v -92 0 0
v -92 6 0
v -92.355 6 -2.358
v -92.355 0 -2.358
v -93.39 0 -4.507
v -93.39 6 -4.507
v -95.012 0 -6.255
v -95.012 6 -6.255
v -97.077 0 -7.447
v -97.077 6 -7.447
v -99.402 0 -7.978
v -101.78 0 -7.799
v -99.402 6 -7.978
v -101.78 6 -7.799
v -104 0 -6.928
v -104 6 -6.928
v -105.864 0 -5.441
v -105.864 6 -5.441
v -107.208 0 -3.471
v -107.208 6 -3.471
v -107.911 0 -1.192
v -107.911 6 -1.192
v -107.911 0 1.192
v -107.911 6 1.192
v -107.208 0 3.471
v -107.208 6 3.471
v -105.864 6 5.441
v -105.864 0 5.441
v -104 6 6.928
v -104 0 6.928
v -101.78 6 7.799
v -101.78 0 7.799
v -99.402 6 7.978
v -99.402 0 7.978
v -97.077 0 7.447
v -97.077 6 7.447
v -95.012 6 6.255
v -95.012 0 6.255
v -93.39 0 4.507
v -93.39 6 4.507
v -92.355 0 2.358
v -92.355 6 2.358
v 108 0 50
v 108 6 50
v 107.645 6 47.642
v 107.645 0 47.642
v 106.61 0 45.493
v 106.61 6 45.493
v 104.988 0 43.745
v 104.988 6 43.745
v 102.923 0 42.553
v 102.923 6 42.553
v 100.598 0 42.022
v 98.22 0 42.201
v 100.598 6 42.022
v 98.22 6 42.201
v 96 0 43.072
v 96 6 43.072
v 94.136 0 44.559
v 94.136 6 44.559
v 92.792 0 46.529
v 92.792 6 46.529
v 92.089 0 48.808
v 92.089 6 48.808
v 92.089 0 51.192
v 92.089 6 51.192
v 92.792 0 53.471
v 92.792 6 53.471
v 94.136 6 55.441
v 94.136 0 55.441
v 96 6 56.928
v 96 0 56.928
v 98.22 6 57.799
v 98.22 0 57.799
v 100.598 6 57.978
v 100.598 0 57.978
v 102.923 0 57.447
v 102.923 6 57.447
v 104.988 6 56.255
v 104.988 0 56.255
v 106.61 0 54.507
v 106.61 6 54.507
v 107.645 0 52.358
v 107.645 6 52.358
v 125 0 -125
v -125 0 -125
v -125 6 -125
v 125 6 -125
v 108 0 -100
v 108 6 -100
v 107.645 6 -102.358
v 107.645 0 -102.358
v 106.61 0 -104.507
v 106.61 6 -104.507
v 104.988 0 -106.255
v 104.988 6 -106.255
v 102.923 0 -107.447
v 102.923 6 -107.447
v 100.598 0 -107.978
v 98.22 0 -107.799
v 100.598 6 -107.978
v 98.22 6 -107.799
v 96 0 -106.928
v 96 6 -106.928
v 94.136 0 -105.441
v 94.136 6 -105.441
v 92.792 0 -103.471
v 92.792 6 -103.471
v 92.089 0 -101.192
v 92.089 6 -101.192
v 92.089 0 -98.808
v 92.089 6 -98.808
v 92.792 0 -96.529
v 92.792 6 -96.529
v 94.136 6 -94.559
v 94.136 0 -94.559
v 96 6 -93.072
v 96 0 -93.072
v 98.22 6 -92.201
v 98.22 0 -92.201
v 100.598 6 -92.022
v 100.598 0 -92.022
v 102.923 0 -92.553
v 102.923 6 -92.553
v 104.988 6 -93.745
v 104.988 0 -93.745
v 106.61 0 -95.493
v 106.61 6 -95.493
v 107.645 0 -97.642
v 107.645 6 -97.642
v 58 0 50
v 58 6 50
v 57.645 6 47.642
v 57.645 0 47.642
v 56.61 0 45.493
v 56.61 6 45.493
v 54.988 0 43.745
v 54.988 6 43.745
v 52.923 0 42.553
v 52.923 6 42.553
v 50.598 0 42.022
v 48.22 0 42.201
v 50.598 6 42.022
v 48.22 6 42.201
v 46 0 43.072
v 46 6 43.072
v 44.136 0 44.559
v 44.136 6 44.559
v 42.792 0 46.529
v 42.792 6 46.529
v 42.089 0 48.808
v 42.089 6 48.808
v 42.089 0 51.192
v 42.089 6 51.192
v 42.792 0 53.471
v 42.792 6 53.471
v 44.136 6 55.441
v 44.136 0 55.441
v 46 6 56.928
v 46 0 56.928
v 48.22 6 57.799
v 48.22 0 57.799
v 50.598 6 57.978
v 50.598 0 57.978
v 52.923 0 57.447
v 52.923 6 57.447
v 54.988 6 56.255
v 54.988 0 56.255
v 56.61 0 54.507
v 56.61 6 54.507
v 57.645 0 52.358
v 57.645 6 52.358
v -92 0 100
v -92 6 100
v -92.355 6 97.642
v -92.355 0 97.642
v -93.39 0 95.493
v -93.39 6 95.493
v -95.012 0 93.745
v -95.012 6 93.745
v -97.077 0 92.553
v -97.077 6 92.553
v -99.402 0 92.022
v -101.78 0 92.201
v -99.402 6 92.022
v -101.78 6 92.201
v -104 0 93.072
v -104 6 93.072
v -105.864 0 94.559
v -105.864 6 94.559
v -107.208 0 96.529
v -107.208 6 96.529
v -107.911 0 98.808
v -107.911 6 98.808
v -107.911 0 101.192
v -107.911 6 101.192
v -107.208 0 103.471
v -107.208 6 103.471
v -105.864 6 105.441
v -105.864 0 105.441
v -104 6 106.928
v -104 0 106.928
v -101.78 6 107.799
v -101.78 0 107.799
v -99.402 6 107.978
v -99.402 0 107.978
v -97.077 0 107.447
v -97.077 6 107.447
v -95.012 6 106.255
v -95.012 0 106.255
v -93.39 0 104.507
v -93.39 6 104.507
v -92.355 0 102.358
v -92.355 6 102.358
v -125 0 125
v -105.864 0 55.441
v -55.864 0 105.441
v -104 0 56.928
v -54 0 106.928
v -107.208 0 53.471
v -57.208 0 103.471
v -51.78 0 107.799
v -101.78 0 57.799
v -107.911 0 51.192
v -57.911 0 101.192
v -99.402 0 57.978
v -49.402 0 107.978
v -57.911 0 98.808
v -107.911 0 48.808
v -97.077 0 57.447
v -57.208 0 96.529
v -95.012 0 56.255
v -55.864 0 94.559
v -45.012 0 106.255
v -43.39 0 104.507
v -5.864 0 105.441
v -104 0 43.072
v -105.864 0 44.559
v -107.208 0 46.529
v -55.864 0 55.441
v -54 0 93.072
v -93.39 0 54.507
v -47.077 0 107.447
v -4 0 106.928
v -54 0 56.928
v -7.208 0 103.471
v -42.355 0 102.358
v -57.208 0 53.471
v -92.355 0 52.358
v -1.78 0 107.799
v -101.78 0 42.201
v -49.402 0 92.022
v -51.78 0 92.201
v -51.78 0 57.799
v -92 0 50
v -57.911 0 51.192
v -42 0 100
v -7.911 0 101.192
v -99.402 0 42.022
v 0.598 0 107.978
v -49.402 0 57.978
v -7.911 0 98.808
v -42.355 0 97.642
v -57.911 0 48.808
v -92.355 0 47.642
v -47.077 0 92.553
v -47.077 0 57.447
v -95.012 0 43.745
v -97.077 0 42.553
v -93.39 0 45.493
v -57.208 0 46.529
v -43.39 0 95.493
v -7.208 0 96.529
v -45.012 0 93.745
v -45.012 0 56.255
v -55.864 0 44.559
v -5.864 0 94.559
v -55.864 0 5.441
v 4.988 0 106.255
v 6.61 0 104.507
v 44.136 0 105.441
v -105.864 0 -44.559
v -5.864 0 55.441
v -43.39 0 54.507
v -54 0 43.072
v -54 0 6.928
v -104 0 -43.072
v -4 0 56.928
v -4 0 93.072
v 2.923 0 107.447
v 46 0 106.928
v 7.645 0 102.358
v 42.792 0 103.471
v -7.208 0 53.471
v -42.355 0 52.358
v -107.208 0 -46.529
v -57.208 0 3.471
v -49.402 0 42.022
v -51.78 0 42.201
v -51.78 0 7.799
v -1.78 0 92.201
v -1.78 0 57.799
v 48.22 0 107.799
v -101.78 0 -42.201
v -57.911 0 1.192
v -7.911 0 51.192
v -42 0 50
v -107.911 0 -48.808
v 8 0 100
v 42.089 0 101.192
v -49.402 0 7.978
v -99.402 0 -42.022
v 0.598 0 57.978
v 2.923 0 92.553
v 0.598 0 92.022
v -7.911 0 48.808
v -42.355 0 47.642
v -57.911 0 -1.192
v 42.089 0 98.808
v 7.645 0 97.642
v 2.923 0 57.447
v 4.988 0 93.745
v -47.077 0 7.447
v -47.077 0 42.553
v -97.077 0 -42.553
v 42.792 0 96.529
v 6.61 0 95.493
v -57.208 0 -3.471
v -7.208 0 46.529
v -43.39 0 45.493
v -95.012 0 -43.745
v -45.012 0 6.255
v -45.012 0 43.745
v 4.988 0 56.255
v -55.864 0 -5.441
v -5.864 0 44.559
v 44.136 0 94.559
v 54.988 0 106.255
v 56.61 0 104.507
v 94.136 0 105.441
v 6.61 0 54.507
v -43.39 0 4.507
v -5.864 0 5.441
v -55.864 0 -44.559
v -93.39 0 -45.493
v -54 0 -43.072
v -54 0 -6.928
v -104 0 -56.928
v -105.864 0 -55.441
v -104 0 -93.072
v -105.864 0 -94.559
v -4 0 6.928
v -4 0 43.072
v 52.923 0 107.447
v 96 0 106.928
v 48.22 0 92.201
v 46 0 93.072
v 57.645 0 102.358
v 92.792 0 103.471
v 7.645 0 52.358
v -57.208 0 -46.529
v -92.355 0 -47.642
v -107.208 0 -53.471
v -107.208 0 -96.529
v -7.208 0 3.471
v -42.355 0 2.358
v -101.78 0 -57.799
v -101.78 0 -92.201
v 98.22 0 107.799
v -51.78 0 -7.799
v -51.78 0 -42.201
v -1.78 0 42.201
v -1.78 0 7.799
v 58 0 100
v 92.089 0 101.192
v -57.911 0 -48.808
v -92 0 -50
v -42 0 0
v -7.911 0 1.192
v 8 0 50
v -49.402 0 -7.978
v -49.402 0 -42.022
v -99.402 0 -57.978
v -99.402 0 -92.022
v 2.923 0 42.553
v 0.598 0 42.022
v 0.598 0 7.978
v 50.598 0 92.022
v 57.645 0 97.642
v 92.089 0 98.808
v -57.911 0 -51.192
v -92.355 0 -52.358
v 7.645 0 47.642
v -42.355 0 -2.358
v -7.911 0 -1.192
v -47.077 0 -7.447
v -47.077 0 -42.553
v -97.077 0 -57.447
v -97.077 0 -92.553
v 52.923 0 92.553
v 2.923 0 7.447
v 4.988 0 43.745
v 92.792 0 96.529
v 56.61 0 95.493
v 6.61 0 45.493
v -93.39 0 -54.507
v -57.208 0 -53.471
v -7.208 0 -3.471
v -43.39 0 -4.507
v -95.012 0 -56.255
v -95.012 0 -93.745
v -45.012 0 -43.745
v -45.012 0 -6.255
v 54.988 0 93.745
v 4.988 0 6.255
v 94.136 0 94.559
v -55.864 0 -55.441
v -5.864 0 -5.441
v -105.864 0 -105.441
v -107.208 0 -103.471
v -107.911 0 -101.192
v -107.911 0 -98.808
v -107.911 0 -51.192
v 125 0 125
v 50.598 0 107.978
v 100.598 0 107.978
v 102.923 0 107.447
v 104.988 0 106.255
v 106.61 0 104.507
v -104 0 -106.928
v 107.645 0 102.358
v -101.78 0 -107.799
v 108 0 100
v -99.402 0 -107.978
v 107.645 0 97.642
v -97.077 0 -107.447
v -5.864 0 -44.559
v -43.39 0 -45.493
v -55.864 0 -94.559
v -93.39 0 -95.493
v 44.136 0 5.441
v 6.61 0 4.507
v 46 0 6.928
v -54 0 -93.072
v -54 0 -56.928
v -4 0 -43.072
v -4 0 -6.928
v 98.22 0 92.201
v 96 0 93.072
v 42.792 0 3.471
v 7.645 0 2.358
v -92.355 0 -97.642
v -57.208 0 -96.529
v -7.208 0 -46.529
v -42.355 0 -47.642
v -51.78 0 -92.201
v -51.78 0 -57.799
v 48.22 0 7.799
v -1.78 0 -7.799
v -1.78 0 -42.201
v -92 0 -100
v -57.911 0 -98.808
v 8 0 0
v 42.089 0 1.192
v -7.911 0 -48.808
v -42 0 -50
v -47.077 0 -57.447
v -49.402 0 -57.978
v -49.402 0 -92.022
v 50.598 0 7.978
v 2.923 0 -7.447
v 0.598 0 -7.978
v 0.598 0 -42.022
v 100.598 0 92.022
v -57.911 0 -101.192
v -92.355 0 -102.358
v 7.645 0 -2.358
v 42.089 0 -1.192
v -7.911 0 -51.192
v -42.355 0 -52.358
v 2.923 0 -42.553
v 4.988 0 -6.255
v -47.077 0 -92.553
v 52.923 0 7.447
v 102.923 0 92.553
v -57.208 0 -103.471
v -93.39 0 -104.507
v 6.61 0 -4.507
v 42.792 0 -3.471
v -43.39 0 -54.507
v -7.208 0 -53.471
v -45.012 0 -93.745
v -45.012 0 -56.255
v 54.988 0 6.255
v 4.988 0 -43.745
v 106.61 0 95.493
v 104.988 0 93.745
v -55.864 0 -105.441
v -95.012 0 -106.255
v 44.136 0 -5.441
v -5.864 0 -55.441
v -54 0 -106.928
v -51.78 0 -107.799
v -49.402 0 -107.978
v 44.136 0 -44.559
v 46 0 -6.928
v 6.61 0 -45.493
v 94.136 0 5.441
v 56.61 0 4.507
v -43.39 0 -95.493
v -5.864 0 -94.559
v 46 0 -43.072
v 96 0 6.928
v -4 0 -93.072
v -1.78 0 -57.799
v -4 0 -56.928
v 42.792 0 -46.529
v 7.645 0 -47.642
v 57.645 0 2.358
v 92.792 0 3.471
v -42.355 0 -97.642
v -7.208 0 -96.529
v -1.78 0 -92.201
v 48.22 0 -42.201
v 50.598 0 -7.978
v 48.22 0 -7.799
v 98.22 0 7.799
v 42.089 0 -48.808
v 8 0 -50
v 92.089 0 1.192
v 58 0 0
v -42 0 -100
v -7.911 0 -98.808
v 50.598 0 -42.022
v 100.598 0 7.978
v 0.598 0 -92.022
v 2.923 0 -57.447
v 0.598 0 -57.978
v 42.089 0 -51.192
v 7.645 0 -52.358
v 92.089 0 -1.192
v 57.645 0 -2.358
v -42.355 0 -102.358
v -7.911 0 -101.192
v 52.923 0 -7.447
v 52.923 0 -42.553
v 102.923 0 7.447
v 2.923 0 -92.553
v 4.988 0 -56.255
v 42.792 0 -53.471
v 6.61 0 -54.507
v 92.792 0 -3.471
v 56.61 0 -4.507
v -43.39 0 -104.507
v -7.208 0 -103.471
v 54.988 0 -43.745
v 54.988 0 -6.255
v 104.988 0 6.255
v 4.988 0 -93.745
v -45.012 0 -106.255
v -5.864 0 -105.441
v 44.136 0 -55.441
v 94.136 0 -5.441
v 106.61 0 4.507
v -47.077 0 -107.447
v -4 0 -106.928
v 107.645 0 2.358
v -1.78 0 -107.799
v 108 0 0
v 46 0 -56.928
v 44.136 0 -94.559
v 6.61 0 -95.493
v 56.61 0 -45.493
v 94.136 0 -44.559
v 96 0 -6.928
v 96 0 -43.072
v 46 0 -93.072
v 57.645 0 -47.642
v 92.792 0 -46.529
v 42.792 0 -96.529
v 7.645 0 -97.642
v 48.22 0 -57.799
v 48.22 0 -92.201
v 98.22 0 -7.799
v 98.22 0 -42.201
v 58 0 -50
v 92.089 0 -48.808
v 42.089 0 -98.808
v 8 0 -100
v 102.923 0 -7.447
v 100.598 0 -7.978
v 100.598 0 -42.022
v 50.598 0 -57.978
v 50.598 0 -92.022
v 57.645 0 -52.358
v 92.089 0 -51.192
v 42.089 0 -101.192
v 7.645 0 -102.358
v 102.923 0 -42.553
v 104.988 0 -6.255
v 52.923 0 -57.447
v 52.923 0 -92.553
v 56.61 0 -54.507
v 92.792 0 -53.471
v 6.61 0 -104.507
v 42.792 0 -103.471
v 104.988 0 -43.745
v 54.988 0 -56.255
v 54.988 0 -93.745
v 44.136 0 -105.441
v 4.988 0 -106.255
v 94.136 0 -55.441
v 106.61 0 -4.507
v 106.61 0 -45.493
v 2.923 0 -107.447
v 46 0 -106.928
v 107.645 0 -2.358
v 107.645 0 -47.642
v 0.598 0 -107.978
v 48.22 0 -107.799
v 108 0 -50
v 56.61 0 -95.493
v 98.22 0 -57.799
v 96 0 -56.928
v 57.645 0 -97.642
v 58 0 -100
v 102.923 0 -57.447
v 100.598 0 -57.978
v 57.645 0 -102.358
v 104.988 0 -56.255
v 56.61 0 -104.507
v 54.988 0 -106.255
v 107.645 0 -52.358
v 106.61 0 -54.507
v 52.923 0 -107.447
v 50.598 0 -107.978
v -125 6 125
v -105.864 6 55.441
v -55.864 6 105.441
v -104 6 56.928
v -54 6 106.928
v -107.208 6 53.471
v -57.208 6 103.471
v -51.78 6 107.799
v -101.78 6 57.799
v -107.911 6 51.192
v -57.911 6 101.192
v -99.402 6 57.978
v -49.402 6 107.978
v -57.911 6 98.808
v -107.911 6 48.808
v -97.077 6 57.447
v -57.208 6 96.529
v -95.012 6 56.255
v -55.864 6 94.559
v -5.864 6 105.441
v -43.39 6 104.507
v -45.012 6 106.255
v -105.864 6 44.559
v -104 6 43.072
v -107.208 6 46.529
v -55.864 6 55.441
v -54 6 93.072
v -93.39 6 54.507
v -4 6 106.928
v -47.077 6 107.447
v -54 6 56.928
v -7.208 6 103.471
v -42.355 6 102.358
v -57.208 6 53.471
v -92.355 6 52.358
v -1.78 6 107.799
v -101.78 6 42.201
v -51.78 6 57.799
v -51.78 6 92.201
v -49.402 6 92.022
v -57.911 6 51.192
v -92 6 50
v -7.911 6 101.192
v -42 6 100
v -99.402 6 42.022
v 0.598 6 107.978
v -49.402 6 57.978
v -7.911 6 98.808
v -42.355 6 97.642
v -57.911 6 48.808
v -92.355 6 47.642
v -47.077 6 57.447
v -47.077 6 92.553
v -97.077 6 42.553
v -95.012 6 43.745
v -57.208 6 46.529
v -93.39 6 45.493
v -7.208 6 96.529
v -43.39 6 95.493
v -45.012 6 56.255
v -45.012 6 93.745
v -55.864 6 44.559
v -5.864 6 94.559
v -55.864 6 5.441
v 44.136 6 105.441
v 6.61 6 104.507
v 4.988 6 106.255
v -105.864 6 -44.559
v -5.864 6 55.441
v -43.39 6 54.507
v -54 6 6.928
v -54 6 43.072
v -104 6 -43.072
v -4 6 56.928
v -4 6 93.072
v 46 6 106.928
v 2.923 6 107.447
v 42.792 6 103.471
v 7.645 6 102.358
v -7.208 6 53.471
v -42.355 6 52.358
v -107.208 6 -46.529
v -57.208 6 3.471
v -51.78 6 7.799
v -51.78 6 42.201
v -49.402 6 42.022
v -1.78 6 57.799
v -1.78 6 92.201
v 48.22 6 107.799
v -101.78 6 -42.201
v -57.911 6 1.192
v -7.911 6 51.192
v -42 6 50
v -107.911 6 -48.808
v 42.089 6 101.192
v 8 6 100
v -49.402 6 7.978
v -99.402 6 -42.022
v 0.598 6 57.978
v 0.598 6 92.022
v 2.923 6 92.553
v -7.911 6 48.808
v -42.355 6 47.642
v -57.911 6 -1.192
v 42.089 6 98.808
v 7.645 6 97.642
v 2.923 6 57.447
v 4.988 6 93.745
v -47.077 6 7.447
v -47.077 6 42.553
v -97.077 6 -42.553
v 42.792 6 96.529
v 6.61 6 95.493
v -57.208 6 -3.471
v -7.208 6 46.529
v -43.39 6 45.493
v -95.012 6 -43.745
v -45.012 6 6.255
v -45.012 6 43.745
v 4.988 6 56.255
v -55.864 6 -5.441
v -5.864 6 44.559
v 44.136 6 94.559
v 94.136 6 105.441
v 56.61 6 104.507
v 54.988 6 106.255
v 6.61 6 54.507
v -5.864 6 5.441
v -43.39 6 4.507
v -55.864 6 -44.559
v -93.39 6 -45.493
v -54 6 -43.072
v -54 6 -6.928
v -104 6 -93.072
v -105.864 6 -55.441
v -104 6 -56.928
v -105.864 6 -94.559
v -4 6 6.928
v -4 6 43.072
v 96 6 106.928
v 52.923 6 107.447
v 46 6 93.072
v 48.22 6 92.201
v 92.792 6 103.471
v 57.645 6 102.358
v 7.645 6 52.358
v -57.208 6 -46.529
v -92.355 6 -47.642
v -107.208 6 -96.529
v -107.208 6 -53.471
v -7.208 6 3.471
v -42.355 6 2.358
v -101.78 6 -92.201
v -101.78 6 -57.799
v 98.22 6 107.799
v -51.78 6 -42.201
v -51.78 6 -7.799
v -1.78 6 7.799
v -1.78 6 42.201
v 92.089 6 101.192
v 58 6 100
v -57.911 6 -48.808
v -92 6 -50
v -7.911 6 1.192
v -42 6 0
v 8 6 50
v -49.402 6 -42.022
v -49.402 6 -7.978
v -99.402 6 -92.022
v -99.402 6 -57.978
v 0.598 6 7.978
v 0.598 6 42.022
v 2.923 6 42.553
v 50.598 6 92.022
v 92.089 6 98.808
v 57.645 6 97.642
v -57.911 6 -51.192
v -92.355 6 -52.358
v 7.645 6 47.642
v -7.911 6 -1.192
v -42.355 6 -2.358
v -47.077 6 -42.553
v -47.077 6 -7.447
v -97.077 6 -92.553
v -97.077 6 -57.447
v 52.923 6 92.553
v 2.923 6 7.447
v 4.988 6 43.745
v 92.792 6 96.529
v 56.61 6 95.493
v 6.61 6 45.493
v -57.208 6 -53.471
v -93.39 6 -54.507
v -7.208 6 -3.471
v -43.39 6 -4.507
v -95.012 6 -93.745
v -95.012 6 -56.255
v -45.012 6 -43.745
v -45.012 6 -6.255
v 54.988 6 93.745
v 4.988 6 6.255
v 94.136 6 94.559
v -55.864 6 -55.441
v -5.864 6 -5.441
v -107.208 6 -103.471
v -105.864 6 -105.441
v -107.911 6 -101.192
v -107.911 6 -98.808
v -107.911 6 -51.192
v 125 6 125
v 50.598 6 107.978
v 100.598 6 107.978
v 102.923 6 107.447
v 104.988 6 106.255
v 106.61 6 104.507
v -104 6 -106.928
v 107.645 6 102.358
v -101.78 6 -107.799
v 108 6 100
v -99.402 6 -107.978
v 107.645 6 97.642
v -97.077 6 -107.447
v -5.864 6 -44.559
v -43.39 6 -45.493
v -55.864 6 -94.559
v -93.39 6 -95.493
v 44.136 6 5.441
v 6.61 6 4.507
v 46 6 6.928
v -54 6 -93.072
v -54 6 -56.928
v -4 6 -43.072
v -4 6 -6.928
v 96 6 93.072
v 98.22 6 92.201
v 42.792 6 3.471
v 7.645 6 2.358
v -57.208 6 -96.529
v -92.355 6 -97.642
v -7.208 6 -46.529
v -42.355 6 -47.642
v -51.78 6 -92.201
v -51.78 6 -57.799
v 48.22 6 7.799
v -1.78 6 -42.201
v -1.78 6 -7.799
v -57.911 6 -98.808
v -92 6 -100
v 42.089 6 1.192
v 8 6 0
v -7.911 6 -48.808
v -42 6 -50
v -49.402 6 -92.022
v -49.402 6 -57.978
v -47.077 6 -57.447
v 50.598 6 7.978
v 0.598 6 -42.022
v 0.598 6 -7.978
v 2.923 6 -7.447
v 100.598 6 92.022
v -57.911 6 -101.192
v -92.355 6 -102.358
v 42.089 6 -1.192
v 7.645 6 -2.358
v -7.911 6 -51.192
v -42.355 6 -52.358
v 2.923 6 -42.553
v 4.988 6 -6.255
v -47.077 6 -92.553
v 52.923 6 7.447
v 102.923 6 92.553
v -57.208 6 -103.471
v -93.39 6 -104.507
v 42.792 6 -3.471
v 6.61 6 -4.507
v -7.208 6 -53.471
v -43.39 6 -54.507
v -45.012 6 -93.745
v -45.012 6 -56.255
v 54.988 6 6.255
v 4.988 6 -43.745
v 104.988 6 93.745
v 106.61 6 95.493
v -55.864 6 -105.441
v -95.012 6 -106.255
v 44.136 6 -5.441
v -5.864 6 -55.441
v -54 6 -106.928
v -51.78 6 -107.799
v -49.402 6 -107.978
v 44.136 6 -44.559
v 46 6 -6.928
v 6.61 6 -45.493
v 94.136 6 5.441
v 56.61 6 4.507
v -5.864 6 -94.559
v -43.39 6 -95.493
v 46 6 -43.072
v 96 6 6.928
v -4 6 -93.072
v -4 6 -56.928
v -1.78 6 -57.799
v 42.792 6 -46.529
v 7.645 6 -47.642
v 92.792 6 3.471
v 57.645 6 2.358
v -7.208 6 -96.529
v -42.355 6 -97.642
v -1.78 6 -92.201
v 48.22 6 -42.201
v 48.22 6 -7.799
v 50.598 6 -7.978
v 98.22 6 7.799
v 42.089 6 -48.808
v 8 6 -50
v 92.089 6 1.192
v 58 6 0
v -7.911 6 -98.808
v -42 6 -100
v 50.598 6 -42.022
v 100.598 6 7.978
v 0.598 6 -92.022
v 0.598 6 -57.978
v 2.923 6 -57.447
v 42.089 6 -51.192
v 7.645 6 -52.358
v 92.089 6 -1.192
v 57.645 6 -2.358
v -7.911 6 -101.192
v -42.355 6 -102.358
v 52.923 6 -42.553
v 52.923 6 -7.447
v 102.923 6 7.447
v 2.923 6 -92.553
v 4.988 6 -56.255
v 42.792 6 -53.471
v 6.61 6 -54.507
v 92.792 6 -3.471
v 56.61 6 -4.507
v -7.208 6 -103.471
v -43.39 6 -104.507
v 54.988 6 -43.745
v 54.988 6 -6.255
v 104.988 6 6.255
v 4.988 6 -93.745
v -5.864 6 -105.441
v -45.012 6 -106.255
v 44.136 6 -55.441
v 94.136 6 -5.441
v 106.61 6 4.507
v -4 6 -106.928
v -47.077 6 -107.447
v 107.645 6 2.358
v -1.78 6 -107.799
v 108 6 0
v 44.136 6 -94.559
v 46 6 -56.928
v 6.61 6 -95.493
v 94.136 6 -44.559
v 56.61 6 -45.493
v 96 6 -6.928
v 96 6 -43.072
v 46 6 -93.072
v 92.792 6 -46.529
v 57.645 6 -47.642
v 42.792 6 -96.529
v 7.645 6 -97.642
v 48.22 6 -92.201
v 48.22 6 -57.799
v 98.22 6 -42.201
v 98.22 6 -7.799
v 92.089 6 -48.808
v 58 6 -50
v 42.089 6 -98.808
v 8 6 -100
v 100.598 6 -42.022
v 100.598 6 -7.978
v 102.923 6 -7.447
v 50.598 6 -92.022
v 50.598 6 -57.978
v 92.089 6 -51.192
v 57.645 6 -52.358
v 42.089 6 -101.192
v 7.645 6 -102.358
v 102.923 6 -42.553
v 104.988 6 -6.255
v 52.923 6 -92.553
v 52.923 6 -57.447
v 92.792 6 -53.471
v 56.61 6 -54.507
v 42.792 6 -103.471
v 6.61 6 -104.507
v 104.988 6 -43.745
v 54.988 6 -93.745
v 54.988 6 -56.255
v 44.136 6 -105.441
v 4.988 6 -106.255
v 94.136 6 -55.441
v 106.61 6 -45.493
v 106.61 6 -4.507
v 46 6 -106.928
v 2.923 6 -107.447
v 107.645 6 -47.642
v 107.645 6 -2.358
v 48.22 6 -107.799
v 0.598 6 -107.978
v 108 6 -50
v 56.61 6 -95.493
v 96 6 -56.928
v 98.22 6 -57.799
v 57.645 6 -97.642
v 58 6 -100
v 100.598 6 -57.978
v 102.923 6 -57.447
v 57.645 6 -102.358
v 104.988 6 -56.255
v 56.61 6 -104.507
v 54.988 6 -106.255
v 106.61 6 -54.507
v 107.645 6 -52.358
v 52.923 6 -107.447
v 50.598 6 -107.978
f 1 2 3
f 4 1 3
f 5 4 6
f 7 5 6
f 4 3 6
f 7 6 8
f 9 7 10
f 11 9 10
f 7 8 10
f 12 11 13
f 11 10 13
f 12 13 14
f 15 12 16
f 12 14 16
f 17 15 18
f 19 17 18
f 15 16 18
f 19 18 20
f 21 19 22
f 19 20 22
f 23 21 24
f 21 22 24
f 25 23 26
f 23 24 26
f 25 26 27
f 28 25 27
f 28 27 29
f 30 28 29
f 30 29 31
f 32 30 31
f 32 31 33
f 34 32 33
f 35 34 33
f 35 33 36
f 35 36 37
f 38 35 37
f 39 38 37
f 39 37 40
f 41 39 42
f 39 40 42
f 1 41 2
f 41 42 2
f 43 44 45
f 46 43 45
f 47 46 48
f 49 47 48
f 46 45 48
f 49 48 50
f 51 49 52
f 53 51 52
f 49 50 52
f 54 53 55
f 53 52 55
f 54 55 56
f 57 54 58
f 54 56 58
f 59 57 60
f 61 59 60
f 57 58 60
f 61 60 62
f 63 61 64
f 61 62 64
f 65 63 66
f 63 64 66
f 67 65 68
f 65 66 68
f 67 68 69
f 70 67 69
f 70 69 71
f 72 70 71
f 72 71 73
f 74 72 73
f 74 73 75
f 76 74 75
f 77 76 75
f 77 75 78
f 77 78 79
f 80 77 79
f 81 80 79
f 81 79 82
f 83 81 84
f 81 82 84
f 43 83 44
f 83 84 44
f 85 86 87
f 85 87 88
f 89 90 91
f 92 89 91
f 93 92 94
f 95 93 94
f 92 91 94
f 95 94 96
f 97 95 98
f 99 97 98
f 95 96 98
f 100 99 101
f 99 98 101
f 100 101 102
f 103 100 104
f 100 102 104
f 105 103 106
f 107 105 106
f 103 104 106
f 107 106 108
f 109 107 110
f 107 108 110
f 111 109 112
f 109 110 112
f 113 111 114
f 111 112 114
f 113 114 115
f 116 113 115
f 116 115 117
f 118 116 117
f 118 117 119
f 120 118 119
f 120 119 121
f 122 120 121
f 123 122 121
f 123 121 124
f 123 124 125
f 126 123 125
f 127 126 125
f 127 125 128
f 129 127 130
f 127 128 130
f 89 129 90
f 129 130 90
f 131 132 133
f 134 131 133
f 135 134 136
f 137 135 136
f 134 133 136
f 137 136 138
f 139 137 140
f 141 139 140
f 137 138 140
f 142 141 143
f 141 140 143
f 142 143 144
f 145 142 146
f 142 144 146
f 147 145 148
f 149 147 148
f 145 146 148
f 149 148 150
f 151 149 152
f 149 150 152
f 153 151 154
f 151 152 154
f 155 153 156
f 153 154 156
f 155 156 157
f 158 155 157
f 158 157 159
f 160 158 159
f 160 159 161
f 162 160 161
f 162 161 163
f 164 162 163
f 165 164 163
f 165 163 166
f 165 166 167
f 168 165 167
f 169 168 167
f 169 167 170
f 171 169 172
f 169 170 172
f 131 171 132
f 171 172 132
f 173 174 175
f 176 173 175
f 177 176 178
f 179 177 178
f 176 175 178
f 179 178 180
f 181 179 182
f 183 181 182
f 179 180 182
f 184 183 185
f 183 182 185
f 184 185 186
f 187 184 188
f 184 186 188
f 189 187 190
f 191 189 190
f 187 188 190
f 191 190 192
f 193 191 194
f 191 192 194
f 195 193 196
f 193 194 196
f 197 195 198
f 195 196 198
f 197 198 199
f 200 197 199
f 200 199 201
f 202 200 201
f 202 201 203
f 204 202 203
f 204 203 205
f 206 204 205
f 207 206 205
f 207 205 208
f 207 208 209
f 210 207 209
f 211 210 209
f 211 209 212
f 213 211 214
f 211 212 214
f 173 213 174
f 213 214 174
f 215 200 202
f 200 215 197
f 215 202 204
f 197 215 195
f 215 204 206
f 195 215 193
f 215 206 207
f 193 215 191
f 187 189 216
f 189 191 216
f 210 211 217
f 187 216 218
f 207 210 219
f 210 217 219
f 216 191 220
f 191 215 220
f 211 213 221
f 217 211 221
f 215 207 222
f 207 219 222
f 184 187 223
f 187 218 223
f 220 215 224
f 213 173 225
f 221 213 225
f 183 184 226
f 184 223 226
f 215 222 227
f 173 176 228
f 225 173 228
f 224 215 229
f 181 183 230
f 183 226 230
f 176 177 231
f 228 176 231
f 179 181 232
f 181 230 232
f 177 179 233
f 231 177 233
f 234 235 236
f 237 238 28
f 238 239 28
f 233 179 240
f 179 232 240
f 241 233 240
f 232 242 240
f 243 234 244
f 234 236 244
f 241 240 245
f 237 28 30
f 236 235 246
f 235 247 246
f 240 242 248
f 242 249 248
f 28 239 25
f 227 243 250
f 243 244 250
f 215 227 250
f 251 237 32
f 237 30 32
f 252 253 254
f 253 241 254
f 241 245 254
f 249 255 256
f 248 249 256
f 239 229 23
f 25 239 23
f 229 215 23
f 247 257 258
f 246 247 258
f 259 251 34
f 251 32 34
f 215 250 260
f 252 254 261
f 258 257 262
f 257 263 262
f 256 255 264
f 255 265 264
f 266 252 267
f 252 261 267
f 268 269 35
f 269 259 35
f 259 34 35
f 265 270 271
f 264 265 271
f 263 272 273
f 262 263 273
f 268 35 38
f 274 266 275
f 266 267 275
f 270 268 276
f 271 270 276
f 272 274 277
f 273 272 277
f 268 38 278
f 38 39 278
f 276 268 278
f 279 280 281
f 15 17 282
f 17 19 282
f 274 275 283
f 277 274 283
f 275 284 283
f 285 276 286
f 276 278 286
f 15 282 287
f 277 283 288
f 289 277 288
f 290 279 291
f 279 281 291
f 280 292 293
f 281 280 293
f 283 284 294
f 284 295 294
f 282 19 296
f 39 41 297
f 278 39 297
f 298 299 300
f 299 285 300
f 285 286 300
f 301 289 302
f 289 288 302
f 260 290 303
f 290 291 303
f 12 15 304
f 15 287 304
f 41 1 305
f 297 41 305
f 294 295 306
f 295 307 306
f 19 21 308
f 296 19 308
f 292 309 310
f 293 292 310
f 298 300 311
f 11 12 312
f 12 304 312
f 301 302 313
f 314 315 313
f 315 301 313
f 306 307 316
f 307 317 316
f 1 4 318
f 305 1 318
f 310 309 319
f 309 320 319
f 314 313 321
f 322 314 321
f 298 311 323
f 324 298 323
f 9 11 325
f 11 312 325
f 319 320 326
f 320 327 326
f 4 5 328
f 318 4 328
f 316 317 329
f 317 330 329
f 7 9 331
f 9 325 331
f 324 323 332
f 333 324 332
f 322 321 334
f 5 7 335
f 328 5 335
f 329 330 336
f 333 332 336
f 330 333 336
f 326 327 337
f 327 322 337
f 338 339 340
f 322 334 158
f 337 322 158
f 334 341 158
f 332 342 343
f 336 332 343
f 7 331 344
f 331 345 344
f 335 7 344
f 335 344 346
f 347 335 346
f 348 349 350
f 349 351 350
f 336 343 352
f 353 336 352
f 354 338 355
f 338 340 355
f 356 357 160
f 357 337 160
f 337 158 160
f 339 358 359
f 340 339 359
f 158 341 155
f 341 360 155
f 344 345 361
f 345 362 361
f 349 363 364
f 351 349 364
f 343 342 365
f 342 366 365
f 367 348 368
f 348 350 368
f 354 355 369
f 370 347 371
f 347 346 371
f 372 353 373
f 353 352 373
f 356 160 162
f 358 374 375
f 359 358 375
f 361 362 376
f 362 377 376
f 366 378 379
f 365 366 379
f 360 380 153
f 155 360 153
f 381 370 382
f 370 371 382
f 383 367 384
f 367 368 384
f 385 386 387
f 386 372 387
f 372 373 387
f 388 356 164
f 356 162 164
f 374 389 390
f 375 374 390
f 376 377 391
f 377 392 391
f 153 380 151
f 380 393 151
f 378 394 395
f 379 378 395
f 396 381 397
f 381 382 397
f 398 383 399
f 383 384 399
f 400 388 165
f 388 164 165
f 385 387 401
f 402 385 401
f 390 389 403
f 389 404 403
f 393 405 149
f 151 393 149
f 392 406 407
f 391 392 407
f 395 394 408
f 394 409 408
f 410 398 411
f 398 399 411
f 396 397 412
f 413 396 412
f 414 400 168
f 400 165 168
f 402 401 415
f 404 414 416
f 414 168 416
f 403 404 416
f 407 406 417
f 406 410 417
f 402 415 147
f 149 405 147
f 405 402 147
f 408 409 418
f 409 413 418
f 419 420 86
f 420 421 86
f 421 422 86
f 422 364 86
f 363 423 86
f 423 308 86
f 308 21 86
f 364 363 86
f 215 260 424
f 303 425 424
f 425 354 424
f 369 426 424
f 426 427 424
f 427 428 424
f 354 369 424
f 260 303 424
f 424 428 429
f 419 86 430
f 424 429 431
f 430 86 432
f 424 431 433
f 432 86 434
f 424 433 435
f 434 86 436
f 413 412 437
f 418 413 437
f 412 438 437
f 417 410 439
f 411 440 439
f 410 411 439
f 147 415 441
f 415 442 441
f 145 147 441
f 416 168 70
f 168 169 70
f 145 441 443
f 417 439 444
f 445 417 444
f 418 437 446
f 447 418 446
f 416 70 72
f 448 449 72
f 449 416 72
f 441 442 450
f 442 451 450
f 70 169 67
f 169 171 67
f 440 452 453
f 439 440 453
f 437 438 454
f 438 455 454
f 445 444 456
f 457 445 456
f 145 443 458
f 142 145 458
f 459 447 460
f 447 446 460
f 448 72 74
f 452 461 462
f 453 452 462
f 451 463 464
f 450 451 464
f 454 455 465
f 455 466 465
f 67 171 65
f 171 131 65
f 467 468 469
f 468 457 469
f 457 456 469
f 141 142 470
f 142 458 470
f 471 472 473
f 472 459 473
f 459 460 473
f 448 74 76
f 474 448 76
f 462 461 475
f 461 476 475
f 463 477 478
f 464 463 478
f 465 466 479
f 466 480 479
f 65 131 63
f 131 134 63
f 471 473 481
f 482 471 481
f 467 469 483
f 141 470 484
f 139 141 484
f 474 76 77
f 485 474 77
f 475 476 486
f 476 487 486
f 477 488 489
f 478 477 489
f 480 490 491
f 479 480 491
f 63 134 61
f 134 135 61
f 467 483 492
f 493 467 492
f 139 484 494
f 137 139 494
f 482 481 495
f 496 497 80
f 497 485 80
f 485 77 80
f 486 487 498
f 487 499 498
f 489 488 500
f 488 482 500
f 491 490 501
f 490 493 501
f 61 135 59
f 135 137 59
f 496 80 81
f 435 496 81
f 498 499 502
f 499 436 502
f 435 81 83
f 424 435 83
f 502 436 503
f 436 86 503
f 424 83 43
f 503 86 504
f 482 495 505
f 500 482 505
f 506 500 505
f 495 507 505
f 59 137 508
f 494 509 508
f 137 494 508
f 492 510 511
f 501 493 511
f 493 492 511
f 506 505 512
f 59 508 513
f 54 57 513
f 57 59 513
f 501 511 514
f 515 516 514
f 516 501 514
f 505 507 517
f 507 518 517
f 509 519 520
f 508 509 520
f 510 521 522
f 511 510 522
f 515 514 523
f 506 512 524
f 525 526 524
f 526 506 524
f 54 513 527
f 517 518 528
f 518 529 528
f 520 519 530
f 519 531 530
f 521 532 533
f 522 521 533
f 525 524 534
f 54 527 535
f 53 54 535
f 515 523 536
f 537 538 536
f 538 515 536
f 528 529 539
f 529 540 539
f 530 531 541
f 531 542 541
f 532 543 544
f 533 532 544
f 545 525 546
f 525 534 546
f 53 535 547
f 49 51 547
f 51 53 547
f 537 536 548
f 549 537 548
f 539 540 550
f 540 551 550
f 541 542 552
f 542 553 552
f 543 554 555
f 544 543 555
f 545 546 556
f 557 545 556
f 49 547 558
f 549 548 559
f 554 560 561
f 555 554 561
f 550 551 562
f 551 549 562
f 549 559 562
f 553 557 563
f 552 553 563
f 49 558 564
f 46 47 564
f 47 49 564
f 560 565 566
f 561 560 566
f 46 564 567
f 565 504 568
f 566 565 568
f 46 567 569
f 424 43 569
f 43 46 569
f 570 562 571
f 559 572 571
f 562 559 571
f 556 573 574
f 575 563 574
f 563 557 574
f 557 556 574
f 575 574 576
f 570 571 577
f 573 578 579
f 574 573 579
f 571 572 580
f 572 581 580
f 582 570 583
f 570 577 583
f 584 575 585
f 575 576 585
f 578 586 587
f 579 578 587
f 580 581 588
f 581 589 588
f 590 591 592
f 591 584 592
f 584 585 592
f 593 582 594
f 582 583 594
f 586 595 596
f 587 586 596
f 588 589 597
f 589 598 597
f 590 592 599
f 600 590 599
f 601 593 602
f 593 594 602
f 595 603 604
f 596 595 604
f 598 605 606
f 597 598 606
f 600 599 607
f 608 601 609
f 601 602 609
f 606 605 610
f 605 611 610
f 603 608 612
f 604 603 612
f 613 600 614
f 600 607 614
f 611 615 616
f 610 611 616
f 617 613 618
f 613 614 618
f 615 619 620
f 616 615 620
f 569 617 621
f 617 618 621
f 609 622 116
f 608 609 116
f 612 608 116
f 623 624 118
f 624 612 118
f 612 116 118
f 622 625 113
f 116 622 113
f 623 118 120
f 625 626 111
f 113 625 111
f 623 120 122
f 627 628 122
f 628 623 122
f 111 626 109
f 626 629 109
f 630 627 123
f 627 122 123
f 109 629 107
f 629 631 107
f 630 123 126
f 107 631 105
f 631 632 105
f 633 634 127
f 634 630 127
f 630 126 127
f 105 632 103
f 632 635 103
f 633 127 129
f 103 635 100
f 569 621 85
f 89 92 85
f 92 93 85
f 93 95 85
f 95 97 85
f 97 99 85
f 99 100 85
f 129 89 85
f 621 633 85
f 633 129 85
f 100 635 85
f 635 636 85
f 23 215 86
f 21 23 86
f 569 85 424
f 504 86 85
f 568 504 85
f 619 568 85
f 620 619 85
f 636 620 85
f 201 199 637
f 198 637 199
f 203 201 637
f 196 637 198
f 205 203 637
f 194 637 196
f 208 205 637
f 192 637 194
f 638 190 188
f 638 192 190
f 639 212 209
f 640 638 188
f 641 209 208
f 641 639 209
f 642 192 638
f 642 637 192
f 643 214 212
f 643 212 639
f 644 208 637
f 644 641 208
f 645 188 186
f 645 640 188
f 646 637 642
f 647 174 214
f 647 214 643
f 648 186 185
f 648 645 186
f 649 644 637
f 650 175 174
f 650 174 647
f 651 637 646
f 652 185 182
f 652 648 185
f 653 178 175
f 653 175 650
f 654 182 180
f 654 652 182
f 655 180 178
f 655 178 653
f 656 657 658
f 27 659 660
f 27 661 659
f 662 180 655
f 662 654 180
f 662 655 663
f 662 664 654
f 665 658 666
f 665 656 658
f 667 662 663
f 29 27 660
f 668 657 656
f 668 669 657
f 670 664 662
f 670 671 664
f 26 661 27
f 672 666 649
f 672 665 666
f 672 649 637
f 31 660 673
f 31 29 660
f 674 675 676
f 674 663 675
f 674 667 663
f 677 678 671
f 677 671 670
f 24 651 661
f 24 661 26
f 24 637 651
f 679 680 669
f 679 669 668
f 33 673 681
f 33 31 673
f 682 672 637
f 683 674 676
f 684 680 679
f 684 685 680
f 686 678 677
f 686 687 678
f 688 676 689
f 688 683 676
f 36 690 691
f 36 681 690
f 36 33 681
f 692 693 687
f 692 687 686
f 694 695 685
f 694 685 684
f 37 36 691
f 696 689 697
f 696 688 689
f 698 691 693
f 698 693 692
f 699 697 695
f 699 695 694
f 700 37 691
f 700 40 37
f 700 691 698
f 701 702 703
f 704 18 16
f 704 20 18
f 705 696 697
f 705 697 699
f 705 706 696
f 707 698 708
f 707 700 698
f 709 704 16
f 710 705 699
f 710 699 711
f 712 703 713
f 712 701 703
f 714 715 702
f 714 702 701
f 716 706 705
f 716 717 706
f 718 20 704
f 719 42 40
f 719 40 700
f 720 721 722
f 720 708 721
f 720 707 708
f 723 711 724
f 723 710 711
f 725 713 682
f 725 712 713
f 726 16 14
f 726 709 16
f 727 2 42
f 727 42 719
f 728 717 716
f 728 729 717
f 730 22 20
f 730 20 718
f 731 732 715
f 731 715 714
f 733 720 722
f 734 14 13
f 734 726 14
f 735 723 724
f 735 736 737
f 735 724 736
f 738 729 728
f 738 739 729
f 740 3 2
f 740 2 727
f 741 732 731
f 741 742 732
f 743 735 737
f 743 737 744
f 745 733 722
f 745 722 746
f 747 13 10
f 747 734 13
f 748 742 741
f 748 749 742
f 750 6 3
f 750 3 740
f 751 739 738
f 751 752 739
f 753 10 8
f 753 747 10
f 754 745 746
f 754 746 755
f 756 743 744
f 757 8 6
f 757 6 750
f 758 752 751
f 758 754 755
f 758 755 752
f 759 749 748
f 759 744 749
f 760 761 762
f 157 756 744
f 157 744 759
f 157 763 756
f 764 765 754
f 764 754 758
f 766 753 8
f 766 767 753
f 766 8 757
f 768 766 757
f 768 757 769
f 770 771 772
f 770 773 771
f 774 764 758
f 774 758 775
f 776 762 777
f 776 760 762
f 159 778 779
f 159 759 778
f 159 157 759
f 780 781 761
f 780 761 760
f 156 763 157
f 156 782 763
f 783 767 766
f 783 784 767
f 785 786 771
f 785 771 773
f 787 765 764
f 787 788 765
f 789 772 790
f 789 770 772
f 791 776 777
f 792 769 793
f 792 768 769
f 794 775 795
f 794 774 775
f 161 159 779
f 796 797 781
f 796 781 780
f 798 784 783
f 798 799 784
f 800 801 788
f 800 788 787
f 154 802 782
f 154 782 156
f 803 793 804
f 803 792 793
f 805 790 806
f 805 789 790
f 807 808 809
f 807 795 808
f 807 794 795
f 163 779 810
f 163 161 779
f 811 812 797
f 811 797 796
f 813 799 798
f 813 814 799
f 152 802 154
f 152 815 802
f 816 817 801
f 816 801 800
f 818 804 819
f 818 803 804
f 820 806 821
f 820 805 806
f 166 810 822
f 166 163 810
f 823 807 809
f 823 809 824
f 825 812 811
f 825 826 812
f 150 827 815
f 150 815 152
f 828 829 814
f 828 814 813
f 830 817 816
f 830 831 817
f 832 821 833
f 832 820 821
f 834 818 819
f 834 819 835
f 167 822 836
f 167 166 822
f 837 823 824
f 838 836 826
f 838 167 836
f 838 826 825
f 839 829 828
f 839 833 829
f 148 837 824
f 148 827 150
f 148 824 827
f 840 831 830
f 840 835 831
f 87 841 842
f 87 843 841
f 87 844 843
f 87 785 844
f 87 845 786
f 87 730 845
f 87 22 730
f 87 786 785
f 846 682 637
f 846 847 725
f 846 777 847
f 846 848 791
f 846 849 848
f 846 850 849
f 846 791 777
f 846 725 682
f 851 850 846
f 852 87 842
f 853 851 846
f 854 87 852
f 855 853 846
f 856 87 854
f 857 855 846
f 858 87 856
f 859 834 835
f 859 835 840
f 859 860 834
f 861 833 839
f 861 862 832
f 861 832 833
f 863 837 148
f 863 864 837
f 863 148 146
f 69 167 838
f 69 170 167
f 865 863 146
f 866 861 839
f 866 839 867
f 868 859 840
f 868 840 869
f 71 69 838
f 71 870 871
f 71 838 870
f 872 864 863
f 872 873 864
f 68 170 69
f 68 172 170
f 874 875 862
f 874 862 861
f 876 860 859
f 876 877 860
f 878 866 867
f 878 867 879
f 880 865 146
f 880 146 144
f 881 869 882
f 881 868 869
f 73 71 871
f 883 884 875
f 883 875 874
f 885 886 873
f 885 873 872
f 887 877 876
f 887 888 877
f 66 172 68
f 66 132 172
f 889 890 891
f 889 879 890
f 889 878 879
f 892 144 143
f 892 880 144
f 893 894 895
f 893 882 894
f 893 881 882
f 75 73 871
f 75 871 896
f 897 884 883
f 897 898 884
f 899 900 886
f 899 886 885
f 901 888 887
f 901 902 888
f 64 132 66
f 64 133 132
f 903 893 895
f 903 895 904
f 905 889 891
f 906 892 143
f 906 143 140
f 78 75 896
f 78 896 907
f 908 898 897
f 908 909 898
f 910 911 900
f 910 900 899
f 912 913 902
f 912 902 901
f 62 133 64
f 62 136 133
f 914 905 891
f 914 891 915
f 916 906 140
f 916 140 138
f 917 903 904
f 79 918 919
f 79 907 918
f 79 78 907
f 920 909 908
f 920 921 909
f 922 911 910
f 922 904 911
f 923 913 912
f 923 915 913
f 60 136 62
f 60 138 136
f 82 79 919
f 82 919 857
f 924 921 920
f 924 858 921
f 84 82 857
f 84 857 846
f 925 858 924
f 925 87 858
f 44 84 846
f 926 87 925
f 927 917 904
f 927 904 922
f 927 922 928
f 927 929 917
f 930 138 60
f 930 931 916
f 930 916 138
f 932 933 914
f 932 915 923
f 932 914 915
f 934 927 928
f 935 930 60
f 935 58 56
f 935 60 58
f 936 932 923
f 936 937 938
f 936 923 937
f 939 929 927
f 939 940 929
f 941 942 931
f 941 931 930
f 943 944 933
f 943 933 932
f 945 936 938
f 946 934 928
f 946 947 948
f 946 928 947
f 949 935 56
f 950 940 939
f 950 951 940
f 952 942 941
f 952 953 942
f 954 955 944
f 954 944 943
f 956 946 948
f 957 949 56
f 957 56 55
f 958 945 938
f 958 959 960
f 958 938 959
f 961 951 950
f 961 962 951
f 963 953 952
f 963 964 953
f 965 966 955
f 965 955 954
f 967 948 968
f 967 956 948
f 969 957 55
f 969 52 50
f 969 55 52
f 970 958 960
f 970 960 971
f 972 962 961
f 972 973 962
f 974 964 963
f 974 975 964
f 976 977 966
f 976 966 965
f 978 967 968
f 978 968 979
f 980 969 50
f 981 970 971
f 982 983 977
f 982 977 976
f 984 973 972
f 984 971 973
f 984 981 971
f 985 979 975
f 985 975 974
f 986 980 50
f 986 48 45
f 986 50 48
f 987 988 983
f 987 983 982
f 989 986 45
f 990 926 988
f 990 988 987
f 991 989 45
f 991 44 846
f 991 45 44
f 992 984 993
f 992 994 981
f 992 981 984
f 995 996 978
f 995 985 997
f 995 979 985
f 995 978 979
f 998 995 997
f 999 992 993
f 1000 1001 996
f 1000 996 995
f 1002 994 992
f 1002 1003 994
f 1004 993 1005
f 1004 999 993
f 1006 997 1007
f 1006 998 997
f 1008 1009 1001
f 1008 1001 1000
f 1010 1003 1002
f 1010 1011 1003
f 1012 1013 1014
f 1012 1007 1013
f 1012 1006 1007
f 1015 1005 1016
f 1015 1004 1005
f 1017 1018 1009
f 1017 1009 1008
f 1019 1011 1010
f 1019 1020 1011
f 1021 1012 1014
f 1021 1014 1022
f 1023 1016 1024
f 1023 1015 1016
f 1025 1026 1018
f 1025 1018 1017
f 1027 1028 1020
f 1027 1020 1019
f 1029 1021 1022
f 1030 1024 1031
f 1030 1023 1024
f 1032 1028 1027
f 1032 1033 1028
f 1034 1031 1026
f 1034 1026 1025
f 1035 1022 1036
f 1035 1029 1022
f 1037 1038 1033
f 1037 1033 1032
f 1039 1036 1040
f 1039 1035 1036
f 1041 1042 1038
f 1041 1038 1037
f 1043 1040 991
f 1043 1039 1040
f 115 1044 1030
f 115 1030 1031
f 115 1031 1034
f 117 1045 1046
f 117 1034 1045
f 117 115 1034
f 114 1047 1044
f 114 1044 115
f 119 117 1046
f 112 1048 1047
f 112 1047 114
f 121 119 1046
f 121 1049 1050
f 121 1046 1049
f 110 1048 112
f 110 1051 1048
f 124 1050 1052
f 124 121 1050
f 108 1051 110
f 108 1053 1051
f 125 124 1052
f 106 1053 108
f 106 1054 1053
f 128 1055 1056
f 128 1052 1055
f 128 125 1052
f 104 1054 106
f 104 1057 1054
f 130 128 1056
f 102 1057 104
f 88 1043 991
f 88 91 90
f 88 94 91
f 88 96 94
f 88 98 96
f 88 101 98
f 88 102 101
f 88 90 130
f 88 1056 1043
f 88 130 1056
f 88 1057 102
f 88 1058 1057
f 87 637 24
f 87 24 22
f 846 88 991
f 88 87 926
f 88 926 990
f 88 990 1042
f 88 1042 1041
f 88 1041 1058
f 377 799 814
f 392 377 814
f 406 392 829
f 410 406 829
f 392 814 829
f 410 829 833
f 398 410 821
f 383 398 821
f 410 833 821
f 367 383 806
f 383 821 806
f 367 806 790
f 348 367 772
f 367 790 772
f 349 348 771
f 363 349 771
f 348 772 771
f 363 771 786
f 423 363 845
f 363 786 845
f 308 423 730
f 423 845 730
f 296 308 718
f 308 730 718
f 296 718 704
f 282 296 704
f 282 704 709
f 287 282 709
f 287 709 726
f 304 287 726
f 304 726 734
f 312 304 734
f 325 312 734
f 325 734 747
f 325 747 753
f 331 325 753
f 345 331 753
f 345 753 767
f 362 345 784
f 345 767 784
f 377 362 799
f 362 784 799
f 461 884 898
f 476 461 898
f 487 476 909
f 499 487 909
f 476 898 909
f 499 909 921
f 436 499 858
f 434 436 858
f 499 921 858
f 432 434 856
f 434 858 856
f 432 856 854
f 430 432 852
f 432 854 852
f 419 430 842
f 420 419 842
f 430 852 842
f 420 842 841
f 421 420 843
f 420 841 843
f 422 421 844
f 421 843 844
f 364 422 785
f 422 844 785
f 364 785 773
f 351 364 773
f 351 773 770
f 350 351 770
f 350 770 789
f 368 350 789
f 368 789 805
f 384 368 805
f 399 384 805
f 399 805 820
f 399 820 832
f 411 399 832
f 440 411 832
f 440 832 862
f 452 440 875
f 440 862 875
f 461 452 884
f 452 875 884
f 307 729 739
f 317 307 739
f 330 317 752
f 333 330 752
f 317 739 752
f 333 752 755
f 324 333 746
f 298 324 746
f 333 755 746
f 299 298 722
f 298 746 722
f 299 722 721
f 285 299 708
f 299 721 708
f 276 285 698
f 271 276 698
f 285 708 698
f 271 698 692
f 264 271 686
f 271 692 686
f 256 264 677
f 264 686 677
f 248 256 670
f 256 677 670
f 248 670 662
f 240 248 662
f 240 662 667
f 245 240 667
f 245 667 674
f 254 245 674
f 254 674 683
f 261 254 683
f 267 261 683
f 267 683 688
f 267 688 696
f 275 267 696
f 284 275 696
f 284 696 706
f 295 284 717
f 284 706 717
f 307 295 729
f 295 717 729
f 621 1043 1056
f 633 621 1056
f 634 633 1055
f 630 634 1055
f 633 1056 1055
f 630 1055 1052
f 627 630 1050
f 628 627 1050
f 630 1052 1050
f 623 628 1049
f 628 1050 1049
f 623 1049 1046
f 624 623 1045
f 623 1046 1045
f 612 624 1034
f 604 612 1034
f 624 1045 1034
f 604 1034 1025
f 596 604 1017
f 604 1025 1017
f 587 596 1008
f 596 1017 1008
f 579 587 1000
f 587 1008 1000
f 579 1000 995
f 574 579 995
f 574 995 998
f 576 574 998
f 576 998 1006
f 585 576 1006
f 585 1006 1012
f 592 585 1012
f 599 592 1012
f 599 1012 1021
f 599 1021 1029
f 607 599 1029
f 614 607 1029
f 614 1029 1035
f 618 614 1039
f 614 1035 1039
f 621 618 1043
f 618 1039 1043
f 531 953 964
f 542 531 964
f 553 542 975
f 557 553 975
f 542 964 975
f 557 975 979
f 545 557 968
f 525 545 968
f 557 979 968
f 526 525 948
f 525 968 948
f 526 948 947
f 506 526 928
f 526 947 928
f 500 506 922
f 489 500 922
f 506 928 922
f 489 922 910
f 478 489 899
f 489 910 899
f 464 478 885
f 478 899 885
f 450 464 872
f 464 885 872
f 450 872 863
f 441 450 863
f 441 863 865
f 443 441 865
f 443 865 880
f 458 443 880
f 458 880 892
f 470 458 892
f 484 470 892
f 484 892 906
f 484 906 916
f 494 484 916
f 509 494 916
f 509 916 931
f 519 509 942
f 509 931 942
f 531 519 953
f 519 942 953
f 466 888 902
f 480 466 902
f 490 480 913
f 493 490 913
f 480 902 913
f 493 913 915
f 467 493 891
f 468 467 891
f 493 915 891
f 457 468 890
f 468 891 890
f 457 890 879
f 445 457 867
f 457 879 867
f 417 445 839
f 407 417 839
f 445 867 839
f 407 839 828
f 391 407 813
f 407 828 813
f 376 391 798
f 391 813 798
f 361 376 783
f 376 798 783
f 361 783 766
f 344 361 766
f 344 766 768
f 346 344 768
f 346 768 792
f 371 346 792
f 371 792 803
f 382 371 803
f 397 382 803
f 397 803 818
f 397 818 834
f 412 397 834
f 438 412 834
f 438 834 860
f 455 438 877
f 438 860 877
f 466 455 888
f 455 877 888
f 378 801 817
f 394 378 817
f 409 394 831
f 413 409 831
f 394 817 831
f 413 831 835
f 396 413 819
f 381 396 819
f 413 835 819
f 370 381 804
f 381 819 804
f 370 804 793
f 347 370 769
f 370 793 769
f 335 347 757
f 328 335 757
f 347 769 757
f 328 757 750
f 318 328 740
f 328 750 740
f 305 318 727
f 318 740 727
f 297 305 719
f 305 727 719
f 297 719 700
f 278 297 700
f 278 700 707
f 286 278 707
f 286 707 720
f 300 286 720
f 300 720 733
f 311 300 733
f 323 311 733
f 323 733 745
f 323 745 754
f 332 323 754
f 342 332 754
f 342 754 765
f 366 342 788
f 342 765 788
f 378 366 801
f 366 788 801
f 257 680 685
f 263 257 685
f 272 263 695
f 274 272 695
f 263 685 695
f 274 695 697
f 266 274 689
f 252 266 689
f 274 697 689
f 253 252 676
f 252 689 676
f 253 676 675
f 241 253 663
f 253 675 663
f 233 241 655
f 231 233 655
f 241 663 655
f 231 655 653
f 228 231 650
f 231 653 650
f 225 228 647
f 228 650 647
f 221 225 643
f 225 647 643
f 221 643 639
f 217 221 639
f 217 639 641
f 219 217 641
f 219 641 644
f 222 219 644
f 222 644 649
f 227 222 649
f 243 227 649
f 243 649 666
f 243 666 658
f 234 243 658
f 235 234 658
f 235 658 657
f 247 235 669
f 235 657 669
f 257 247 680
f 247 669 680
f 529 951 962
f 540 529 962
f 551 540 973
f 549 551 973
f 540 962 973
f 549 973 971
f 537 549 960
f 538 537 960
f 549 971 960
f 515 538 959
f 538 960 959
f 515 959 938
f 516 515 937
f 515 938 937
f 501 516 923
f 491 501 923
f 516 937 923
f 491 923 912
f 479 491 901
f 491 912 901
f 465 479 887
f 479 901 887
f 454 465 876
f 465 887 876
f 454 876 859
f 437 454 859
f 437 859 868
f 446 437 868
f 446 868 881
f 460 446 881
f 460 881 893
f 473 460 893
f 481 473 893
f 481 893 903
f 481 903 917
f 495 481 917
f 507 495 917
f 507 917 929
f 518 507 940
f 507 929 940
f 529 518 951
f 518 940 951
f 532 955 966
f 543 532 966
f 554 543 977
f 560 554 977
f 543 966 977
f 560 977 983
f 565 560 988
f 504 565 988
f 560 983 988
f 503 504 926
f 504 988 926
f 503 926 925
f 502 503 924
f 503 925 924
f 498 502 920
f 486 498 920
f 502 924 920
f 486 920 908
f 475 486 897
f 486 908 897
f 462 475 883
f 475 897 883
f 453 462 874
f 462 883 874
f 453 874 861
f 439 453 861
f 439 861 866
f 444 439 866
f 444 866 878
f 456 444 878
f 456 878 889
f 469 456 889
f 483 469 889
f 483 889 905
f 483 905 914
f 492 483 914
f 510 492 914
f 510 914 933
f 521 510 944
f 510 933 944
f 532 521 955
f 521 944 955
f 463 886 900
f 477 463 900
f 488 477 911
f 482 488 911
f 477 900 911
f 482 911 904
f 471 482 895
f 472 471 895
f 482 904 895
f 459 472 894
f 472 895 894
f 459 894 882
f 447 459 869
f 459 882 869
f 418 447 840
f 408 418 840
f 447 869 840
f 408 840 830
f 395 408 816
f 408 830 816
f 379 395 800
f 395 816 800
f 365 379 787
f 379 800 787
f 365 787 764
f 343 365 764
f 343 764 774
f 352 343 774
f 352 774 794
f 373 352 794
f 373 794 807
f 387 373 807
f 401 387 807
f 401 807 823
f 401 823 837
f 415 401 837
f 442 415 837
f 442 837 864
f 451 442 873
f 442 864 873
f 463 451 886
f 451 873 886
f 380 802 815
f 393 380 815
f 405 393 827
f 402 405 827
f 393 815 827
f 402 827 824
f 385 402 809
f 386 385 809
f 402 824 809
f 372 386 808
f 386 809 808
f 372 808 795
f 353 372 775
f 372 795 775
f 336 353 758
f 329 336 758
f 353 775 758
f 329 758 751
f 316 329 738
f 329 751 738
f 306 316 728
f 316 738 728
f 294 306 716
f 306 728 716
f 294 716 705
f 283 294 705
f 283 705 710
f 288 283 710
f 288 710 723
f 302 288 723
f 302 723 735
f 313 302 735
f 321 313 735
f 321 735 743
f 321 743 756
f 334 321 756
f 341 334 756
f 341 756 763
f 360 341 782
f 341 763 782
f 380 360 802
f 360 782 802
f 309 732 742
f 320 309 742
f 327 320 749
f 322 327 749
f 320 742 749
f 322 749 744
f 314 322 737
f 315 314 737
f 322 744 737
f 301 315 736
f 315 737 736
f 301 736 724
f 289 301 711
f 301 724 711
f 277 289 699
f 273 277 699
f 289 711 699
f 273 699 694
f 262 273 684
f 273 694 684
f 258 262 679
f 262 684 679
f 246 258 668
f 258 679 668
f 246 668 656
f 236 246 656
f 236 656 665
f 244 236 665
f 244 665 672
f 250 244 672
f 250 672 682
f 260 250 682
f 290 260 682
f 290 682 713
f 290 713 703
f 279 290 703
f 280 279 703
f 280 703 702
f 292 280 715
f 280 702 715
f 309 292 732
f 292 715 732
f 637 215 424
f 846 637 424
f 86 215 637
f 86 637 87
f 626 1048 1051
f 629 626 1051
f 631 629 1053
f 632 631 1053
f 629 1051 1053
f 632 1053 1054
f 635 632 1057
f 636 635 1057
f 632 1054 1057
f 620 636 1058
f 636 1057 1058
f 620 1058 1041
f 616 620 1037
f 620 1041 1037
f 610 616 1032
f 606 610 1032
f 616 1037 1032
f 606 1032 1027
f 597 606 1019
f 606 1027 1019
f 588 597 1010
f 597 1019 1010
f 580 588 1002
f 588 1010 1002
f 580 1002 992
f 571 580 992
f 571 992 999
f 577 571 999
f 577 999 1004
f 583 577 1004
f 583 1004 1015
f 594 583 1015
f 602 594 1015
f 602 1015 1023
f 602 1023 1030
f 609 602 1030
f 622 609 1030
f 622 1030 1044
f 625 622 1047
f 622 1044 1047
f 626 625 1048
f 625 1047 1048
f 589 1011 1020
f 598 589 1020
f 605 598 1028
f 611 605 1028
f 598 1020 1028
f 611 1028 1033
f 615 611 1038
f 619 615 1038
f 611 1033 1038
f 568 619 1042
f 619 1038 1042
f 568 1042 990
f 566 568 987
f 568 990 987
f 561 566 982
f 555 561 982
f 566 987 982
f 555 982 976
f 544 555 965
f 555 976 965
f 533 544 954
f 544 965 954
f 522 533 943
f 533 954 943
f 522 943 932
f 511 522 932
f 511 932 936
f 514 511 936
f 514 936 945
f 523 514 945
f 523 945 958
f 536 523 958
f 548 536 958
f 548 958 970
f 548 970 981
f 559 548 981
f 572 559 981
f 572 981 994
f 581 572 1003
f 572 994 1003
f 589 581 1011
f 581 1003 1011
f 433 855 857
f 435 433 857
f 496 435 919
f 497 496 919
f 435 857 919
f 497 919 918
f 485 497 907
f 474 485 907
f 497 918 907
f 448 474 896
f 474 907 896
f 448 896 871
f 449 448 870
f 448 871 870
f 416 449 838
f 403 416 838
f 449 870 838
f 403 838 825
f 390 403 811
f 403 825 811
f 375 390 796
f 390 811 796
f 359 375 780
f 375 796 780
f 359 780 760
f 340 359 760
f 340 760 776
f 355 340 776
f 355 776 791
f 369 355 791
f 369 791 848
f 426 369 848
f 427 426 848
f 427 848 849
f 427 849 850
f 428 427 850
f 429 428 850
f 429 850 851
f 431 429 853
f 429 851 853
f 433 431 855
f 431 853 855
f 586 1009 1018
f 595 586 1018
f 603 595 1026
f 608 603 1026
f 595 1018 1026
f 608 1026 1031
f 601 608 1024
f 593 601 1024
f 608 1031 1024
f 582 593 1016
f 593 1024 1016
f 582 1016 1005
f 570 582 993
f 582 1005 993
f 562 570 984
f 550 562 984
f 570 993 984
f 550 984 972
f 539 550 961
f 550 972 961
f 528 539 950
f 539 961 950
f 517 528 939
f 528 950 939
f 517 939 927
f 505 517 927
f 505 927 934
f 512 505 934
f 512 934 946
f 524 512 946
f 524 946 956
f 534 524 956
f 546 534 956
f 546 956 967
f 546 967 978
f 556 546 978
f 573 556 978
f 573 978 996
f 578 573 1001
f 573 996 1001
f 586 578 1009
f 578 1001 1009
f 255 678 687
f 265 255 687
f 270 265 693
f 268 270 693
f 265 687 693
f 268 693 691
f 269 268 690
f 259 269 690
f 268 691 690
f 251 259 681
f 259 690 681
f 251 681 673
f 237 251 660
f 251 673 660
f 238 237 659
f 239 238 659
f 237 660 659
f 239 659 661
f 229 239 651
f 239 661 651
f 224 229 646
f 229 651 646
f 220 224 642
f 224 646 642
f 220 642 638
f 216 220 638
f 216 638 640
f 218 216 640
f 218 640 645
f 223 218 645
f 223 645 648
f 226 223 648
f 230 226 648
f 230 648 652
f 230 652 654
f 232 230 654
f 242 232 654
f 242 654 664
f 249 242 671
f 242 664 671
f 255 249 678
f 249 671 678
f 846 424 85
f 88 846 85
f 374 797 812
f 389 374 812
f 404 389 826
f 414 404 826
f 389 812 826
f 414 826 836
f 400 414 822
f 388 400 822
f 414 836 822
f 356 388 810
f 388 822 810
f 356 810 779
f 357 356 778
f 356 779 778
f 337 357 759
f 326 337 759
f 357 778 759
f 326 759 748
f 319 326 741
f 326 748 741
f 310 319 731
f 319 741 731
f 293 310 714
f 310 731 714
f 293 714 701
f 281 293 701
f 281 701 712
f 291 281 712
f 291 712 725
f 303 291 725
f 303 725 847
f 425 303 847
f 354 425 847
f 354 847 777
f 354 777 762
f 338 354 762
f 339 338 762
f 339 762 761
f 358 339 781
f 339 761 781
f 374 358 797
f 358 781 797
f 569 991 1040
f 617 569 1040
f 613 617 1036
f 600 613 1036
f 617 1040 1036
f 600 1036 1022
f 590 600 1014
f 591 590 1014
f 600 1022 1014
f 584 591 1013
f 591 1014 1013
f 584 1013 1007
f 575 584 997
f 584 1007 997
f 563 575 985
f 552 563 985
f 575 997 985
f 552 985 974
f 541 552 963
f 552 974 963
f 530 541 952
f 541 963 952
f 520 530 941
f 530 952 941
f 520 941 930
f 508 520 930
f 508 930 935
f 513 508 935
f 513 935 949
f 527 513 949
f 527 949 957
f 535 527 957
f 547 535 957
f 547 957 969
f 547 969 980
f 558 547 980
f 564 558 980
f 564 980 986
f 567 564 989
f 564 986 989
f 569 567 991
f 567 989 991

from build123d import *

# Parameters (mm, degrees)
SKETCH_1_W          = 250
SKETCH_1_H          = 250
EXTRUDE_1_DEPTH     = 6
SKETCH_2_R          = 8
CUT_EXTRUDE_1_DEPTH = 6


with BuildPart() as part:
    # Эскиз1 → Бобышка-Вытянуть1 (new body)
    with BuildSketch(Plane(origin=(0, 0, 0), x_dir=(1, 0, 0), z_dir=(0, 1, 0))):
        Rectangle(SKETCH_1_W, SKETCH_1_H)
    extrude(amount=EXTRUDE_1_DEPTH)

    # Эскиз2 → Вырез-Вытянуть1 (cut)
    with BuildSketch(Plane(origin=(0, 6, 0), x_dir=(1, 0, 0), z_dir=(0, 1, 0))):
        with Locations((-100, -100)):
            Circle(SKETCH_2_R)
        with Locations((-50, -100)):
            Circle(SKETCH_2_R)
        with Locations((0, -100)):
            Circle(SKETCH_2_R)
        with Locations((50, -100)):
            Circle(SKETCH_2_R)
        with Locations((100, -100)):
            Circle(SKETCH_2_R)
        with Locations((-50, -50)):
            Circle(SKETCH_2_R)
        with Locations((0, -50)):
            Circle(SKETCH_2_R)
        with Locations((50, -50)):
            Circle(SKETCH_2_R)
        with Locations((100, -50)):
            Circle(SKETCH_2_R)
        with Locations((-50, 0)):
            Circle(SKETCH_2_R)
        Circle(SKETCH_2_R)
        with Locations((50, 0)):
            Circle(SKETCH_2_R)
        with Locations((100, 0)):
            Circle(SKETCH_2_R)
        with Locations((-50, 50)):
            Circle(SKETCH_2_R)
        with Locations((0, 50)):
            Circle(SKETCH_2_R)
        with Locations((50, 50)):
            Circle(SKETCH_2_R)
        with Locations((100, 50)):
            Circle(SKETCH_2_R)
        with Locations((-50, 100)):
            Circle(SKETCH_2_R)
        with Locations((0, 100)):
            Circle(SKETCH_2_R)
        with Locations((50, 100)):
            Circle(SKETCH_2_R)
        with Locations((100, 100)):
            Circle(SKETCH_2_R)
        with Locations((-100, -50)):
            Circle(SKETCH_2_R)
        with Locations((-100, 0)):
            Circle(SKETCH_2_R)
        with Locations((-100, 50)):
            Circle(SKETCH_2_R)
        with Locations((-100, 100)):
            Circle(SKETCH_2_R)
    extrude(amount=-CUT_EXTRUDE_1_DEPTH, mode=Mode.SUBTRACT)


solid = part.part
